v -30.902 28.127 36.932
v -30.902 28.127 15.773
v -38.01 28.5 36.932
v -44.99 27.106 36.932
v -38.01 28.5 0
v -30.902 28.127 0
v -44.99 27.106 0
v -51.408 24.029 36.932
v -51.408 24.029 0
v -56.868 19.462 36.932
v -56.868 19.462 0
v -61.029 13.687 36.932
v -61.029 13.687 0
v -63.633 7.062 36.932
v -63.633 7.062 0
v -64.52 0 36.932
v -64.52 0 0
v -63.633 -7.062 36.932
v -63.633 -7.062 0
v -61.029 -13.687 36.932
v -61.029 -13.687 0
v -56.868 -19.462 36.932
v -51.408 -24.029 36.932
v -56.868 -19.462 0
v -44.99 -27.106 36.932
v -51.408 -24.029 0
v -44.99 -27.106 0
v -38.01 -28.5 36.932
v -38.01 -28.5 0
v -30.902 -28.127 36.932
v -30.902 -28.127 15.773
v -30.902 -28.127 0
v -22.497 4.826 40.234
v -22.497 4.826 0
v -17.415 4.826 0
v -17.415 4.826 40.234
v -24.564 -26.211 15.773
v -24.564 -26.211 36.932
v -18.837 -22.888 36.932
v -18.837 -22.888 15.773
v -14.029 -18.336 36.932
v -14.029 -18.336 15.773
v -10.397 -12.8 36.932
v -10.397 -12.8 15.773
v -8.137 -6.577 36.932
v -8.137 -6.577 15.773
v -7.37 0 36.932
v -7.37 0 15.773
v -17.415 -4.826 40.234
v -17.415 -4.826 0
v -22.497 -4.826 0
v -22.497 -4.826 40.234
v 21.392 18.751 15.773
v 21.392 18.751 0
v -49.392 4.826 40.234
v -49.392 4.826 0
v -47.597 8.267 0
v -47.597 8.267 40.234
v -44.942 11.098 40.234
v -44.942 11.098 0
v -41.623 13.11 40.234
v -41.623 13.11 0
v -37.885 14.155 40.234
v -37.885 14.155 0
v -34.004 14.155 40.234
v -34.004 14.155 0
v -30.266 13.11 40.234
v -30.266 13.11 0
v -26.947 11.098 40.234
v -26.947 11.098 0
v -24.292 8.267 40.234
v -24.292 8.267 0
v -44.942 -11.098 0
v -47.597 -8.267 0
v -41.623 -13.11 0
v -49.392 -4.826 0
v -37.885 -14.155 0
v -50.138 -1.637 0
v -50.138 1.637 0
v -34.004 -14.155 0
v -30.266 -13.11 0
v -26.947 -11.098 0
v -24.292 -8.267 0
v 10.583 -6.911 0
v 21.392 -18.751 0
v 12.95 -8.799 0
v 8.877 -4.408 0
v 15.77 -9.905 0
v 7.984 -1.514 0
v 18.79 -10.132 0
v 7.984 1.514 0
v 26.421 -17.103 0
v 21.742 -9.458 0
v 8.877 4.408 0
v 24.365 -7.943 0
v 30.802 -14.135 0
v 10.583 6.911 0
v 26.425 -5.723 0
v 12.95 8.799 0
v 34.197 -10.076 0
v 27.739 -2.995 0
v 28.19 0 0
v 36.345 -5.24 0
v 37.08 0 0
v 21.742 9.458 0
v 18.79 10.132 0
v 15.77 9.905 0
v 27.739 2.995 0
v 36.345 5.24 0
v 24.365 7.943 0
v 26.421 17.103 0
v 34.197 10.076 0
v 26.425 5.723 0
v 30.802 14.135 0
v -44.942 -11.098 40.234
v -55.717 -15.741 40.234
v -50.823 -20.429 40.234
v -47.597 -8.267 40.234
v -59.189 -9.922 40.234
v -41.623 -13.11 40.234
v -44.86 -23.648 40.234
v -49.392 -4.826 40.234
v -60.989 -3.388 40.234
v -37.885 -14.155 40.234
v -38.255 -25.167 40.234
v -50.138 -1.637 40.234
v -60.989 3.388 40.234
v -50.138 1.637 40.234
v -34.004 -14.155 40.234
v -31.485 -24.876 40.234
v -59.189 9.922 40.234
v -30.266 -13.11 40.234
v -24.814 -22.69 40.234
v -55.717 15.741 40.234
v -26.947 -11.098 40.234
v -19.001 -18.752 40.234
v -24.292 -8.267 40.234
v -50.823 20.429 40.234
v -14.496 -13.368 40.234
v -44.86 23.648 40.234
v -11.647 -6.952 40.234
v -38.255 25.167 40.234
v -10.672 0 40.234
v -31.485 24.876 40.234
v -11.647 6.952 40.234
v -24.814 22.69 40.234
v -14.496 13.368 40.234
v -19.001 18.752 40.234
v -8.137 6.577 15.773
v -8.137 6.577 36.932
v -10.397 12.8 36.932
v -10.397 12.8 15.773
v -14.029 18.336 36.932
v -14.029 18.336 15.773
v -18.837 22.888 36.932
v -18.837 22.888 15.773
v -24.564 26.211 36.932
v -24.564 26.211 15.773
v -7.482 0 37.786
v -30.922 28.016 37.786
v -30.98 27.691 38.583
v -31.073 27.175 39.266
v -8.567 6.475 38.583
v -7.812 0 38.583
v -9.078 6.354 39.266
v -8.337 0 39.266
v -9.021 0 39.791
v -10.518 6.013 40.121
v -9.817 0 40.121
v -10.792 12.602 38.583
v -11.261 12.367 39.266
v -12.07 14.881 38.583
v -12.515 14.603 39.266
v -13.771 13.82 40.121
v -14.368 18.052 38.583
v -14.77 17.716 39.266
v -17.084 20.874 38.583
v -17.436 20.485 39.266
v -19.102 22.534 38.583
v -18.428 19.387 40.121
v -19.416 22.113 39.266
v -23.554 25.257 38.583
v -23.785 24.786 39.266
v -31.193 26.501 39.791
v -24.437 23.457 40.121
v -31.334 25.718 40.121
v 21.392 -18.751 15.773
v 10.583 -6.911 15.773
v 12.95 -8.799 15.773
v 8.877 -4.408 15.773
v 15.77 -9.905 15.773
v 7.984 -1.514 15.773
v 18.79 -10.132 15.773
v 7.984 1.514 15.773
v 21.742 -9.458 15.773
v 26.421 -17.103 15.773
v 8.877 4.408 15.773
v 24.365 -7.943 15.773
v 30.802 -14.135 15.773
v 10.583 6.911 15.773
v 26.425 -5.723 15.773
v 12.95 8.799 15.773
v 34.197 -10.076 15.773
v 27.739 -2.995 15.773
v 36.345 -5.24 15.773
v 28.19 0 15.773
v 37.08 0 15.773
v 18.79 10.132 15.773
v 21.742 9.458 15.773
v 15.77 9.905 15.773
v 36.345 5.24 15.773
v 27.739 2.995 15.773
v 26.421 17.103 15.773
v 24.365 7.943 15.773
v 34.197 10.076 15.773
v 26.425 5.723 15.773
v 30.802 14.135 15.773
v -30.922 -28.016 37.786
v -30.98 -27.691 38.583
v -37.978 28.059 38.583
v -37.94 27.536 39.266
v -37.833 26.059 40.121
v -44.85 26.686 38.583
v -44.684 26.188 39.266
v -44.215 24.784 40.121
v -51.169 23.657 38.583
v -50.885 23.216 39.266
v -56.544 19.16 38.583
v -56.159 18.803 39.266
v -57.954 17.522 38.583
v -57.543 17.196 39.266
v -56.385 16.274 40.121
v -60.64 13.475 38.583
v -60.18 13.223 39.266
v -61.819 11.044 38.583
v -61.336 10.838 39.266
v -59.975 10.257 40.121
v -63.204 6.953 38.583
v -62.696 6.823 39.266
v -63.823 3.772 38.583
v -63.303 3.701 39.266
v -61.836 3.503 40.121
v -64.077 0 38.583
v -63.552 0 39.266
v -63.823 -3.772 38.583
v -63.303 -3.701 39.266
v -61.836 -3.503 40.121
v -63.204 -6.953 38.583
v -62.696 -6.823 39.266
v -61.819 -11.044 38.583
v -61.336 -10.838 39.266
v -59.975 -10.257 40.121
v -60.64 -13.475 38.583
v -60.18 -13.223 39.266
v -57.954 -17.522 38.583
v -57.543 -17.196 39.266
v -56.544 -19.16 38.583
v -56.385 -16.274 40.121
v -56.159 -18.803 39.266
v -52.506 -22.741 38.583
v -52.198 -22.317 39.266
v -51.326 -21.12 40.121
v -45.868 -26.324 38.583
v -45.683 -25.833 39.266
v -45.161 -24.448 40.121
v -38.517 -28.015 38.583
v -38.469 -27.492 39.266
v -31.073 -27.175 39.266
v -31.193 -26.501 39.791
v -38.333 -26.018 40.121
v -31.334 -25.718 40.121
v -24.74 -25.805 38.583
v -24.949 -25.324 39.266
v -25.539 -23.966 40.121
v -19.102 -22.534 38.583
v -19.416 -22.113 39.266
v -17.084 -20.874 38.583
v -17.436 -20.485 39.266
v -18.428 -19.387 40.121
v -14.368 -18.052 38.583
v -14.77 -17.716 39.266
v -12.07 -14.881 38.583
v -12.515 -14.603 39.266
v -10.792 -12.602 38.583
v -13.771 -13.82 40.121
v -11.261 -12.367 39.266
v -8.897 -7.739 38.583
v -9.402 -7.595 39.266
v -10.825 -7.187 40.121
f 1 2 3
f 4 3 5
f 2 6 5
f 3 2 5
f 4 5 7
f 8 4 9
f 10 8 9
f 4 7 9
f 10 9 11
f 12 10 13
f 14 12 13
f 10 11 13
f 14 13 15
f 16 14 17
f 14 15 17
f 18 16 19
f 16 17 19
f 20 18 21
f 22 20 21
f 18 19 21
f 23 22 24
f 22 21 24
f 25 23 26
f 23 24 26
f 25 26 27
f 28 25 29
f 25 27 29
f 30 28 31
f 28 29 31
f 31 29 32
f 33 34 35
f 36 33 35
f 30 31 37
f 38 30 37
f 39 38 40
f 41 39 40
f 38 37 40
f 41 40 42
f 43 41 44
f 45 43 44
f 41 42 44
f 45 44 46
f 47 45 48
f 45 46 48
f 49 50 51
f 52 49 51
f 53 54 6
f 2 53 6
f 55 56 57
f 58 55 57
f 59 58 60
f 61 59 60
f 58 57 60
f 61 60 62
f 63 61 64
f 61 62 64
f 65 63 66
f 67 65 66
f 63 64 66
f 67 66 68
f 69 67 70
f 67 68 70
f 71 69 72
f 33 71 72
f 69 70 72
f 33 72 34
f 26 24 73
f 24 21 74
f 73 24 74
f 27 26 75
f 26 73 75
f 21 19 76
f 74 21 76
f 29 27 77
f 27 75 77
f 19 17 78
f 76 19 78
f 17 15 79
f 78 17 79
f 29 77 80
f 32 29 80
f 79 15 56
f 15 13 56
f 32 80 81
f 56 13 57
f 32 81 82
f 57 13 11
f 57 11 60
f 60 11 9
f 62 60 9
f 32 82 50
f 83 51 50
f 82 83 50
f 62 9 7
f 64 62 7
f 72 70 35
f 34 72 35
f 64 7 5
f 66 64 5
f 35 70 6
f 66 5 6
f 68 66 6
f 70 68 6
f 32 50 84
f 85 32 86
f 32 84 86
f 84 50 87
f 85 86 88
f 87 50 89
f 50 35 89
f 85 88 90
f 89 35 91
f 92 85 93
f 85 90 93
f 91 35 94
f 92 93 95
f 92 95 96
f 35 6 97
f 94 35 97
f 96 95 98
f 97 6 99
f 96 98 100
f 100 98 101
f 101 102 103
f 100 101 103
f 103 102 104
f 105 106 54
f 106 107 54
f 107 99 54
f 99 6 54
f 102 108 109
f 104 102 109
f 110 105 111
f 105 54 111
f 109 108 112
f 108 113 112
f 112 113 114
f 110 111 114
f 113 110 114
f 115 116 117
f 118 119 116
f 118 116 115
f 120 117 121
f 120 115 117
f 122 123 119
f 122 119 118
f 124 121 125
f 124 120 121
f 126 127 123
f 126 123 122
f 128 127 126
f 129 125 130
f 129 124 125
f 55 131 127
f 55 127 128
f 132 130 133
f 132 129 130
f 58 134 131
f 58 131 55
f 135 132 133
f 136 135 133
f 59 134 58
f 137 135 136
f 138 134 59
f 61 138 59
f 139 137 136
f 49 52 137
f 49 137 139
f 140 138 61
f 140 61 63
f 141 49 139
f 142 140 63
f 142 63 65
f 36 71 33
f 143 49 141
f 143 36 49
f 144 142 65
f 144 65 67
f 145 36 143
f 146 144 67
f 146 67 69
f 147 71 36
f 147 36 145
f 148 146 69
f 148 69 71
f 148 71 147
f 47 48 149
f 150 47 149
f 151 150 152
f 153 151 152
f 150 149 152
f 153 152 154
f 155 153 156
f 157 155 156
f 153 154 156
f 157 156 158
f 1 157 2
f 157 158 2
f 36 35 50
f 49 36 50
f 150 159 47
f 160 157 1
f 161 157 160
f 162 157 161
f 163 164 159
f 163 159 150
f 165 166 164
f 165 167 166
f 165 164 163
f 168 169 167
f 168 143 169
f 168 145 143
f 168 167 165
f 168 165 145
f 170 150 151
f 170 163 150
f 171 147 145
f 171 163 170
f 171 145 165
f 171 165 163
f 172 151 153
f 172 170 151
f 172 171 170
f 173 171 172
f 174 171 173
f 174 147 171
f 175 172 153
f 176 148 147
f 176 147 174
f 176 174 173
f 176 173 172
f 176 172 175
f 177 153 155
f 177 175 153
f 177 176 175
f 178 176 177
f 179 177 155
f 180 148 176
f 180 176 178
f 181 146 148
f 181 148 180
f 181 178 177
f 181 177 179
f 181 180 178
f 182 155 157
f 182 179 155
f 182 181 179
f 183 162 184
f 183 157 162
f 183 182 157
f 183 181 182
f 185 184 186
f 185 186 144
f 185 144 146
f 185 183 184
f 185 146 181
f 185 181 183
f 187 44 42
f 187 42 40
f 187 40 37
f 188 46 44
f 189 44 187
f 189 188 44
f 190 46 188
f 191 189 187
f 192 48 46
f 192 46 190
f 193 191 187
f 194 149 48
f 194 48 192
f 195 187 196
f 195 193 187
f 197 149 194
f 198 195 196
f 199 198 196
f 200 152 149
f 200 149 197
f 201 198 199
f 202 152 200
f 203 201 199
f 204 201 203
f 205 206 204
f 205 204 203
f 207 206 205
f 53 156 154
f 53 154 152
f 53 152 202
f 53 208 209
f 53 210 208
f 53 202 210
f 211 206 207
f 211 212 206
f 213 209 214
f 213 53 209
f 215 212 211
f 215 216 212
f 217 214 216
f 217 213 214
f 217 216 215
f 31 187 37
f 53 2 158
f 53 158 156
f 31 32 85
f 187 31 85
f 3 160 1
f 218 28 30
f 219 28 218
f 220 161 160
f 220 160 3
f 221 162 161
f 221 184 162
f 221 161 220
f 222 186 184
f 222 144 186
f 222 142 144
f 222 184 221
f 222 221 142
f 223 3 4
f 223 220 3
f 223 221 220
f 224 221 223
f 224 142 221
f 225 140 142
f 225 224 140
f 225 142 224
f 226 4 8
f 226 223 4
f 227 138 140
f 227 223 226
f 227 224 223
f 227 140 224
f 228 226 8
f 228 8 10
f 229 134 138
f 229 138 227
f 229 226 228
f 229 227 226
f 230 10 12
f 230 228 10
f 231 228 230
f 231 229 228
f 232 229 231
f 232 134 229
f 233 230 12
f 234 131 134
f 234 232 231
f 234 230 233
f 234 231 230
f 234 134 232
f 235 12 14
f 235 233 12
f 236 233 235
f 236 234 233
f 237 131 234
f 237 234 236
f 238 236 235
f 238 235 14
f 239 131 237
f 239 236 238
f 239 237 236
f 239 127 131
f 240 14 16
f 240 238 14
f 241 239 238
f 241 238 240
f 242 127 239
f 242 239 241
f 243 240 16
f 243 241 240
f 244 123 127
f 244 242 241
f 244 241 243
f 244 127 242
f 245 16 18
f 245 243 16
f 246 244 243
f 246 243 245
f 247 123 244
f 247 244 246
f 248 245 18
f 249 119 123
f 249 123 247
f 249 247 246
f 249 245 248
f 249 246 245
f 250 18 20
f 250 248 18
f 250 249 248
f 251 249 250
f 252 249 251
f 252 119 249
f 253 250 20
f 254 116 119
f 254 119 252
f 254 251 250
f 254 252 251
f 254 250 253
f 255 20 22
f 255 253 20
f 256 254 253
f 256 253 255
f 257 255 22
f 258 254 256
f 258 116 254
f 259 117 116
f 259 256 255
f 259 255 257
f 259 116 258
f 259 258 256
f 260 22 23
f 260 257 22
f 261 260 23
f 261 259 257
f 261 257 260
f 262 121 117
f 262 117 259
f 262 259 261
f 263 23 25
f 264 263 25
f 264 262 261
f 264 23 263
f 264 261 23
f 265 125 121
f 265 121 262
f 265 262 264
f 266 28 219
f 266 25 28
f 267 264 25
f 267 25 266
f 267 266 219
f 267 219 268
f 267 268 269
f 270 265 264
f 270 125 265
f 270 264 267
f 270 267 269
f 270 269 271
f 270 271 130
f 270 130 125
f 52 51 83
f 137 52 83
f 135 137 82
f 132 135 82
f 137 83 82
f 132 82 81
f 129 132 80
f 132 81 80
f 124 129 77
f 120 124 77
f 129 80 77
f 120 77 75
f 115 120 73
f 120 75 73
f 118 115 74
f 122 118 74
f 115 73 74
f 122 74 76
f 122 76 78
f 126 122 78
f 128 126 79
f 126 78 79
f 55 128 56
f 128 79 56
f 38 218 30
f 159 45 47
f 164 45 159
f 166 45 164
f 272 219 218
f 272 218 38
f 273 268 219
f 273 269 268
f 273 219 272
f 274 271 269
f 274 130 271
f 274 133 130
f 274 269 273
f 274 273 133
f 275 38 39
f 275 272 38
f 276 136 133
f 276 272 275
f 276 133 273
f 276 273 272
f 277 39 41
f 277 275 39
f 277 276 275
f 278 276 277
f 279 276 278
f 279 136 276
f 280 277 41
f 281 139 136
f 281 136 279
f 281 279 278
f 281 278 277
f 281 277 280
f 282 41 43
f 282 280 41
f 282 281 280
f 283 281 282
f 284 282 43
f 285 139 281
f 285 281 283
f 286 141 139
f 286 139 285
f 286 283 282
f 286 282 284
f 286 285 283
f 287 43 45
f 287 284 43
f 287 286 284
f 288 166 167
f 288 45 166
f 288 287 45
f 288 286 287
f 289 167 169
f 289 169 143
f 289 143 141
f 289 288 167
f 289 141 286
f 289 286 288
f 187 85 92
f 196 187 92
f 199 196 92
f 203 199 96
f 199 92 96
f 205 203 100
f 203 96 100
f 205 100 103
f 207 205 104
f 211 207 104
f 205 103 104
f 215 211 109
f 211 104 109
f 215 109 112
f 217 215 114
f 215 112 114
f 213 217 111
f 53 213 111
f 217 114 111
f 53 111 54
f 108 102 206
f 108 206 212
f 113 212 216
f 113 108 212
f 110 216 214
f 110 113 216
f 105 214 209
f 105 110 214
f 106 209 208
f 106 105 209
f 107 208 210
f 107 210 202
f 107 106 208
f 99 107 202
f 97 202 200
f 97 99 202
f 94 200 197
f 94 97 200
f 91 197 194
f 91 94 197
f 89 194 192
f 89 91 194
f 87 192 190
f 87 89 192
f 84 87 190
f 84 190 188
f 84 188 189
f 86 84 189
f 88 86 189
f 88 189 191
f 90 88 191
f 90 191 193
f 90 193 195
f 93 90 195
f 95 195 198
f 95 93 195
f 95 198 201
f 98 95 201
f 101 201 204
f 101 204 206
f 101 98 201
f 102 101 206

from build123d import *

# Parameters (mm, degrees)
F1_DEPTH = 40.2336
F0_R     = 10.16
F2_DEPTH = 15.7734
F3_R     = 3.302


with BuildPart() as f1:
    # F0 (on Top) → F1 (new body)
    with BuildSketch(Plane.XY):
        with BuildLine():
            ThreePointArc((-30.901911, -28.126541), (-14.028534, -18.336262), (-7.369558, 0))
            ThreePointArc((-7.369558, 0), (-14.028534, 18.336262), (-30.901911, 28.126541))
            ThreePointArc((-30.901911, 28.126541), (-64.519558, 0), (-30.901911, -28.126541))
        make_face()
        with BuildLine():
            ThreePointArc((-49.392323, -4.826), (-50.232058, 0), (-49.392323, 4.826))
            ThreePointArc((-49.392323, 4.826), (-35.944558, 14.2875), (-22.496793, 4.826))
            Line((-22.496793, 4.826), (-17.415258, 4.826))
            Line((-17.415258, 4.826), (-17.415258, -4.826))
            Line((-17.415258, -4.826), (-22.496793, -4.826))
            ThreePointArc((-22.496793, -4.826), (-35.944558, -14.2875), (-49.392323, -4.826))
        make_face(mode=Mode.SUBTRACT)
    extrude(amount=F1_DEPTH)

    # F0 (on Top) → F2 (join)
    with BuildSketch(Plane.XY):
        with BuildLine():
            ThreePointArc((-30.901911, 28.126541), (-14.028534, 18.336262), (-7.369558, 0))
            ThreePointArc((-7.369558, 0), (-14.028534, -18.336262), (-30.901911, -28.126541))
            Line((-30.901911, -28.126541), (21.392206, -18.751028))
            ThreePointArc((21.392206, -18.751028), (37.080442, 0), (21.392206, 18.751028))
            Line((21.392206, 18.751028), (-30.901911, 28.126541))
        make_face()
        with Locations((18.030442, 0)):
            Circle(F0_R, mode=Mode.SUBTRACT)
    extrude(amount=F2_DEPTH)

    # F3
    f3_edges = [f1.edges().sort_by_distance(p)[0] for p in [
        (-40.987205, 28.126541, 40.2336),
    ]]
    fillet(f3_edges, radius=F3_R)


solid = f1.part
